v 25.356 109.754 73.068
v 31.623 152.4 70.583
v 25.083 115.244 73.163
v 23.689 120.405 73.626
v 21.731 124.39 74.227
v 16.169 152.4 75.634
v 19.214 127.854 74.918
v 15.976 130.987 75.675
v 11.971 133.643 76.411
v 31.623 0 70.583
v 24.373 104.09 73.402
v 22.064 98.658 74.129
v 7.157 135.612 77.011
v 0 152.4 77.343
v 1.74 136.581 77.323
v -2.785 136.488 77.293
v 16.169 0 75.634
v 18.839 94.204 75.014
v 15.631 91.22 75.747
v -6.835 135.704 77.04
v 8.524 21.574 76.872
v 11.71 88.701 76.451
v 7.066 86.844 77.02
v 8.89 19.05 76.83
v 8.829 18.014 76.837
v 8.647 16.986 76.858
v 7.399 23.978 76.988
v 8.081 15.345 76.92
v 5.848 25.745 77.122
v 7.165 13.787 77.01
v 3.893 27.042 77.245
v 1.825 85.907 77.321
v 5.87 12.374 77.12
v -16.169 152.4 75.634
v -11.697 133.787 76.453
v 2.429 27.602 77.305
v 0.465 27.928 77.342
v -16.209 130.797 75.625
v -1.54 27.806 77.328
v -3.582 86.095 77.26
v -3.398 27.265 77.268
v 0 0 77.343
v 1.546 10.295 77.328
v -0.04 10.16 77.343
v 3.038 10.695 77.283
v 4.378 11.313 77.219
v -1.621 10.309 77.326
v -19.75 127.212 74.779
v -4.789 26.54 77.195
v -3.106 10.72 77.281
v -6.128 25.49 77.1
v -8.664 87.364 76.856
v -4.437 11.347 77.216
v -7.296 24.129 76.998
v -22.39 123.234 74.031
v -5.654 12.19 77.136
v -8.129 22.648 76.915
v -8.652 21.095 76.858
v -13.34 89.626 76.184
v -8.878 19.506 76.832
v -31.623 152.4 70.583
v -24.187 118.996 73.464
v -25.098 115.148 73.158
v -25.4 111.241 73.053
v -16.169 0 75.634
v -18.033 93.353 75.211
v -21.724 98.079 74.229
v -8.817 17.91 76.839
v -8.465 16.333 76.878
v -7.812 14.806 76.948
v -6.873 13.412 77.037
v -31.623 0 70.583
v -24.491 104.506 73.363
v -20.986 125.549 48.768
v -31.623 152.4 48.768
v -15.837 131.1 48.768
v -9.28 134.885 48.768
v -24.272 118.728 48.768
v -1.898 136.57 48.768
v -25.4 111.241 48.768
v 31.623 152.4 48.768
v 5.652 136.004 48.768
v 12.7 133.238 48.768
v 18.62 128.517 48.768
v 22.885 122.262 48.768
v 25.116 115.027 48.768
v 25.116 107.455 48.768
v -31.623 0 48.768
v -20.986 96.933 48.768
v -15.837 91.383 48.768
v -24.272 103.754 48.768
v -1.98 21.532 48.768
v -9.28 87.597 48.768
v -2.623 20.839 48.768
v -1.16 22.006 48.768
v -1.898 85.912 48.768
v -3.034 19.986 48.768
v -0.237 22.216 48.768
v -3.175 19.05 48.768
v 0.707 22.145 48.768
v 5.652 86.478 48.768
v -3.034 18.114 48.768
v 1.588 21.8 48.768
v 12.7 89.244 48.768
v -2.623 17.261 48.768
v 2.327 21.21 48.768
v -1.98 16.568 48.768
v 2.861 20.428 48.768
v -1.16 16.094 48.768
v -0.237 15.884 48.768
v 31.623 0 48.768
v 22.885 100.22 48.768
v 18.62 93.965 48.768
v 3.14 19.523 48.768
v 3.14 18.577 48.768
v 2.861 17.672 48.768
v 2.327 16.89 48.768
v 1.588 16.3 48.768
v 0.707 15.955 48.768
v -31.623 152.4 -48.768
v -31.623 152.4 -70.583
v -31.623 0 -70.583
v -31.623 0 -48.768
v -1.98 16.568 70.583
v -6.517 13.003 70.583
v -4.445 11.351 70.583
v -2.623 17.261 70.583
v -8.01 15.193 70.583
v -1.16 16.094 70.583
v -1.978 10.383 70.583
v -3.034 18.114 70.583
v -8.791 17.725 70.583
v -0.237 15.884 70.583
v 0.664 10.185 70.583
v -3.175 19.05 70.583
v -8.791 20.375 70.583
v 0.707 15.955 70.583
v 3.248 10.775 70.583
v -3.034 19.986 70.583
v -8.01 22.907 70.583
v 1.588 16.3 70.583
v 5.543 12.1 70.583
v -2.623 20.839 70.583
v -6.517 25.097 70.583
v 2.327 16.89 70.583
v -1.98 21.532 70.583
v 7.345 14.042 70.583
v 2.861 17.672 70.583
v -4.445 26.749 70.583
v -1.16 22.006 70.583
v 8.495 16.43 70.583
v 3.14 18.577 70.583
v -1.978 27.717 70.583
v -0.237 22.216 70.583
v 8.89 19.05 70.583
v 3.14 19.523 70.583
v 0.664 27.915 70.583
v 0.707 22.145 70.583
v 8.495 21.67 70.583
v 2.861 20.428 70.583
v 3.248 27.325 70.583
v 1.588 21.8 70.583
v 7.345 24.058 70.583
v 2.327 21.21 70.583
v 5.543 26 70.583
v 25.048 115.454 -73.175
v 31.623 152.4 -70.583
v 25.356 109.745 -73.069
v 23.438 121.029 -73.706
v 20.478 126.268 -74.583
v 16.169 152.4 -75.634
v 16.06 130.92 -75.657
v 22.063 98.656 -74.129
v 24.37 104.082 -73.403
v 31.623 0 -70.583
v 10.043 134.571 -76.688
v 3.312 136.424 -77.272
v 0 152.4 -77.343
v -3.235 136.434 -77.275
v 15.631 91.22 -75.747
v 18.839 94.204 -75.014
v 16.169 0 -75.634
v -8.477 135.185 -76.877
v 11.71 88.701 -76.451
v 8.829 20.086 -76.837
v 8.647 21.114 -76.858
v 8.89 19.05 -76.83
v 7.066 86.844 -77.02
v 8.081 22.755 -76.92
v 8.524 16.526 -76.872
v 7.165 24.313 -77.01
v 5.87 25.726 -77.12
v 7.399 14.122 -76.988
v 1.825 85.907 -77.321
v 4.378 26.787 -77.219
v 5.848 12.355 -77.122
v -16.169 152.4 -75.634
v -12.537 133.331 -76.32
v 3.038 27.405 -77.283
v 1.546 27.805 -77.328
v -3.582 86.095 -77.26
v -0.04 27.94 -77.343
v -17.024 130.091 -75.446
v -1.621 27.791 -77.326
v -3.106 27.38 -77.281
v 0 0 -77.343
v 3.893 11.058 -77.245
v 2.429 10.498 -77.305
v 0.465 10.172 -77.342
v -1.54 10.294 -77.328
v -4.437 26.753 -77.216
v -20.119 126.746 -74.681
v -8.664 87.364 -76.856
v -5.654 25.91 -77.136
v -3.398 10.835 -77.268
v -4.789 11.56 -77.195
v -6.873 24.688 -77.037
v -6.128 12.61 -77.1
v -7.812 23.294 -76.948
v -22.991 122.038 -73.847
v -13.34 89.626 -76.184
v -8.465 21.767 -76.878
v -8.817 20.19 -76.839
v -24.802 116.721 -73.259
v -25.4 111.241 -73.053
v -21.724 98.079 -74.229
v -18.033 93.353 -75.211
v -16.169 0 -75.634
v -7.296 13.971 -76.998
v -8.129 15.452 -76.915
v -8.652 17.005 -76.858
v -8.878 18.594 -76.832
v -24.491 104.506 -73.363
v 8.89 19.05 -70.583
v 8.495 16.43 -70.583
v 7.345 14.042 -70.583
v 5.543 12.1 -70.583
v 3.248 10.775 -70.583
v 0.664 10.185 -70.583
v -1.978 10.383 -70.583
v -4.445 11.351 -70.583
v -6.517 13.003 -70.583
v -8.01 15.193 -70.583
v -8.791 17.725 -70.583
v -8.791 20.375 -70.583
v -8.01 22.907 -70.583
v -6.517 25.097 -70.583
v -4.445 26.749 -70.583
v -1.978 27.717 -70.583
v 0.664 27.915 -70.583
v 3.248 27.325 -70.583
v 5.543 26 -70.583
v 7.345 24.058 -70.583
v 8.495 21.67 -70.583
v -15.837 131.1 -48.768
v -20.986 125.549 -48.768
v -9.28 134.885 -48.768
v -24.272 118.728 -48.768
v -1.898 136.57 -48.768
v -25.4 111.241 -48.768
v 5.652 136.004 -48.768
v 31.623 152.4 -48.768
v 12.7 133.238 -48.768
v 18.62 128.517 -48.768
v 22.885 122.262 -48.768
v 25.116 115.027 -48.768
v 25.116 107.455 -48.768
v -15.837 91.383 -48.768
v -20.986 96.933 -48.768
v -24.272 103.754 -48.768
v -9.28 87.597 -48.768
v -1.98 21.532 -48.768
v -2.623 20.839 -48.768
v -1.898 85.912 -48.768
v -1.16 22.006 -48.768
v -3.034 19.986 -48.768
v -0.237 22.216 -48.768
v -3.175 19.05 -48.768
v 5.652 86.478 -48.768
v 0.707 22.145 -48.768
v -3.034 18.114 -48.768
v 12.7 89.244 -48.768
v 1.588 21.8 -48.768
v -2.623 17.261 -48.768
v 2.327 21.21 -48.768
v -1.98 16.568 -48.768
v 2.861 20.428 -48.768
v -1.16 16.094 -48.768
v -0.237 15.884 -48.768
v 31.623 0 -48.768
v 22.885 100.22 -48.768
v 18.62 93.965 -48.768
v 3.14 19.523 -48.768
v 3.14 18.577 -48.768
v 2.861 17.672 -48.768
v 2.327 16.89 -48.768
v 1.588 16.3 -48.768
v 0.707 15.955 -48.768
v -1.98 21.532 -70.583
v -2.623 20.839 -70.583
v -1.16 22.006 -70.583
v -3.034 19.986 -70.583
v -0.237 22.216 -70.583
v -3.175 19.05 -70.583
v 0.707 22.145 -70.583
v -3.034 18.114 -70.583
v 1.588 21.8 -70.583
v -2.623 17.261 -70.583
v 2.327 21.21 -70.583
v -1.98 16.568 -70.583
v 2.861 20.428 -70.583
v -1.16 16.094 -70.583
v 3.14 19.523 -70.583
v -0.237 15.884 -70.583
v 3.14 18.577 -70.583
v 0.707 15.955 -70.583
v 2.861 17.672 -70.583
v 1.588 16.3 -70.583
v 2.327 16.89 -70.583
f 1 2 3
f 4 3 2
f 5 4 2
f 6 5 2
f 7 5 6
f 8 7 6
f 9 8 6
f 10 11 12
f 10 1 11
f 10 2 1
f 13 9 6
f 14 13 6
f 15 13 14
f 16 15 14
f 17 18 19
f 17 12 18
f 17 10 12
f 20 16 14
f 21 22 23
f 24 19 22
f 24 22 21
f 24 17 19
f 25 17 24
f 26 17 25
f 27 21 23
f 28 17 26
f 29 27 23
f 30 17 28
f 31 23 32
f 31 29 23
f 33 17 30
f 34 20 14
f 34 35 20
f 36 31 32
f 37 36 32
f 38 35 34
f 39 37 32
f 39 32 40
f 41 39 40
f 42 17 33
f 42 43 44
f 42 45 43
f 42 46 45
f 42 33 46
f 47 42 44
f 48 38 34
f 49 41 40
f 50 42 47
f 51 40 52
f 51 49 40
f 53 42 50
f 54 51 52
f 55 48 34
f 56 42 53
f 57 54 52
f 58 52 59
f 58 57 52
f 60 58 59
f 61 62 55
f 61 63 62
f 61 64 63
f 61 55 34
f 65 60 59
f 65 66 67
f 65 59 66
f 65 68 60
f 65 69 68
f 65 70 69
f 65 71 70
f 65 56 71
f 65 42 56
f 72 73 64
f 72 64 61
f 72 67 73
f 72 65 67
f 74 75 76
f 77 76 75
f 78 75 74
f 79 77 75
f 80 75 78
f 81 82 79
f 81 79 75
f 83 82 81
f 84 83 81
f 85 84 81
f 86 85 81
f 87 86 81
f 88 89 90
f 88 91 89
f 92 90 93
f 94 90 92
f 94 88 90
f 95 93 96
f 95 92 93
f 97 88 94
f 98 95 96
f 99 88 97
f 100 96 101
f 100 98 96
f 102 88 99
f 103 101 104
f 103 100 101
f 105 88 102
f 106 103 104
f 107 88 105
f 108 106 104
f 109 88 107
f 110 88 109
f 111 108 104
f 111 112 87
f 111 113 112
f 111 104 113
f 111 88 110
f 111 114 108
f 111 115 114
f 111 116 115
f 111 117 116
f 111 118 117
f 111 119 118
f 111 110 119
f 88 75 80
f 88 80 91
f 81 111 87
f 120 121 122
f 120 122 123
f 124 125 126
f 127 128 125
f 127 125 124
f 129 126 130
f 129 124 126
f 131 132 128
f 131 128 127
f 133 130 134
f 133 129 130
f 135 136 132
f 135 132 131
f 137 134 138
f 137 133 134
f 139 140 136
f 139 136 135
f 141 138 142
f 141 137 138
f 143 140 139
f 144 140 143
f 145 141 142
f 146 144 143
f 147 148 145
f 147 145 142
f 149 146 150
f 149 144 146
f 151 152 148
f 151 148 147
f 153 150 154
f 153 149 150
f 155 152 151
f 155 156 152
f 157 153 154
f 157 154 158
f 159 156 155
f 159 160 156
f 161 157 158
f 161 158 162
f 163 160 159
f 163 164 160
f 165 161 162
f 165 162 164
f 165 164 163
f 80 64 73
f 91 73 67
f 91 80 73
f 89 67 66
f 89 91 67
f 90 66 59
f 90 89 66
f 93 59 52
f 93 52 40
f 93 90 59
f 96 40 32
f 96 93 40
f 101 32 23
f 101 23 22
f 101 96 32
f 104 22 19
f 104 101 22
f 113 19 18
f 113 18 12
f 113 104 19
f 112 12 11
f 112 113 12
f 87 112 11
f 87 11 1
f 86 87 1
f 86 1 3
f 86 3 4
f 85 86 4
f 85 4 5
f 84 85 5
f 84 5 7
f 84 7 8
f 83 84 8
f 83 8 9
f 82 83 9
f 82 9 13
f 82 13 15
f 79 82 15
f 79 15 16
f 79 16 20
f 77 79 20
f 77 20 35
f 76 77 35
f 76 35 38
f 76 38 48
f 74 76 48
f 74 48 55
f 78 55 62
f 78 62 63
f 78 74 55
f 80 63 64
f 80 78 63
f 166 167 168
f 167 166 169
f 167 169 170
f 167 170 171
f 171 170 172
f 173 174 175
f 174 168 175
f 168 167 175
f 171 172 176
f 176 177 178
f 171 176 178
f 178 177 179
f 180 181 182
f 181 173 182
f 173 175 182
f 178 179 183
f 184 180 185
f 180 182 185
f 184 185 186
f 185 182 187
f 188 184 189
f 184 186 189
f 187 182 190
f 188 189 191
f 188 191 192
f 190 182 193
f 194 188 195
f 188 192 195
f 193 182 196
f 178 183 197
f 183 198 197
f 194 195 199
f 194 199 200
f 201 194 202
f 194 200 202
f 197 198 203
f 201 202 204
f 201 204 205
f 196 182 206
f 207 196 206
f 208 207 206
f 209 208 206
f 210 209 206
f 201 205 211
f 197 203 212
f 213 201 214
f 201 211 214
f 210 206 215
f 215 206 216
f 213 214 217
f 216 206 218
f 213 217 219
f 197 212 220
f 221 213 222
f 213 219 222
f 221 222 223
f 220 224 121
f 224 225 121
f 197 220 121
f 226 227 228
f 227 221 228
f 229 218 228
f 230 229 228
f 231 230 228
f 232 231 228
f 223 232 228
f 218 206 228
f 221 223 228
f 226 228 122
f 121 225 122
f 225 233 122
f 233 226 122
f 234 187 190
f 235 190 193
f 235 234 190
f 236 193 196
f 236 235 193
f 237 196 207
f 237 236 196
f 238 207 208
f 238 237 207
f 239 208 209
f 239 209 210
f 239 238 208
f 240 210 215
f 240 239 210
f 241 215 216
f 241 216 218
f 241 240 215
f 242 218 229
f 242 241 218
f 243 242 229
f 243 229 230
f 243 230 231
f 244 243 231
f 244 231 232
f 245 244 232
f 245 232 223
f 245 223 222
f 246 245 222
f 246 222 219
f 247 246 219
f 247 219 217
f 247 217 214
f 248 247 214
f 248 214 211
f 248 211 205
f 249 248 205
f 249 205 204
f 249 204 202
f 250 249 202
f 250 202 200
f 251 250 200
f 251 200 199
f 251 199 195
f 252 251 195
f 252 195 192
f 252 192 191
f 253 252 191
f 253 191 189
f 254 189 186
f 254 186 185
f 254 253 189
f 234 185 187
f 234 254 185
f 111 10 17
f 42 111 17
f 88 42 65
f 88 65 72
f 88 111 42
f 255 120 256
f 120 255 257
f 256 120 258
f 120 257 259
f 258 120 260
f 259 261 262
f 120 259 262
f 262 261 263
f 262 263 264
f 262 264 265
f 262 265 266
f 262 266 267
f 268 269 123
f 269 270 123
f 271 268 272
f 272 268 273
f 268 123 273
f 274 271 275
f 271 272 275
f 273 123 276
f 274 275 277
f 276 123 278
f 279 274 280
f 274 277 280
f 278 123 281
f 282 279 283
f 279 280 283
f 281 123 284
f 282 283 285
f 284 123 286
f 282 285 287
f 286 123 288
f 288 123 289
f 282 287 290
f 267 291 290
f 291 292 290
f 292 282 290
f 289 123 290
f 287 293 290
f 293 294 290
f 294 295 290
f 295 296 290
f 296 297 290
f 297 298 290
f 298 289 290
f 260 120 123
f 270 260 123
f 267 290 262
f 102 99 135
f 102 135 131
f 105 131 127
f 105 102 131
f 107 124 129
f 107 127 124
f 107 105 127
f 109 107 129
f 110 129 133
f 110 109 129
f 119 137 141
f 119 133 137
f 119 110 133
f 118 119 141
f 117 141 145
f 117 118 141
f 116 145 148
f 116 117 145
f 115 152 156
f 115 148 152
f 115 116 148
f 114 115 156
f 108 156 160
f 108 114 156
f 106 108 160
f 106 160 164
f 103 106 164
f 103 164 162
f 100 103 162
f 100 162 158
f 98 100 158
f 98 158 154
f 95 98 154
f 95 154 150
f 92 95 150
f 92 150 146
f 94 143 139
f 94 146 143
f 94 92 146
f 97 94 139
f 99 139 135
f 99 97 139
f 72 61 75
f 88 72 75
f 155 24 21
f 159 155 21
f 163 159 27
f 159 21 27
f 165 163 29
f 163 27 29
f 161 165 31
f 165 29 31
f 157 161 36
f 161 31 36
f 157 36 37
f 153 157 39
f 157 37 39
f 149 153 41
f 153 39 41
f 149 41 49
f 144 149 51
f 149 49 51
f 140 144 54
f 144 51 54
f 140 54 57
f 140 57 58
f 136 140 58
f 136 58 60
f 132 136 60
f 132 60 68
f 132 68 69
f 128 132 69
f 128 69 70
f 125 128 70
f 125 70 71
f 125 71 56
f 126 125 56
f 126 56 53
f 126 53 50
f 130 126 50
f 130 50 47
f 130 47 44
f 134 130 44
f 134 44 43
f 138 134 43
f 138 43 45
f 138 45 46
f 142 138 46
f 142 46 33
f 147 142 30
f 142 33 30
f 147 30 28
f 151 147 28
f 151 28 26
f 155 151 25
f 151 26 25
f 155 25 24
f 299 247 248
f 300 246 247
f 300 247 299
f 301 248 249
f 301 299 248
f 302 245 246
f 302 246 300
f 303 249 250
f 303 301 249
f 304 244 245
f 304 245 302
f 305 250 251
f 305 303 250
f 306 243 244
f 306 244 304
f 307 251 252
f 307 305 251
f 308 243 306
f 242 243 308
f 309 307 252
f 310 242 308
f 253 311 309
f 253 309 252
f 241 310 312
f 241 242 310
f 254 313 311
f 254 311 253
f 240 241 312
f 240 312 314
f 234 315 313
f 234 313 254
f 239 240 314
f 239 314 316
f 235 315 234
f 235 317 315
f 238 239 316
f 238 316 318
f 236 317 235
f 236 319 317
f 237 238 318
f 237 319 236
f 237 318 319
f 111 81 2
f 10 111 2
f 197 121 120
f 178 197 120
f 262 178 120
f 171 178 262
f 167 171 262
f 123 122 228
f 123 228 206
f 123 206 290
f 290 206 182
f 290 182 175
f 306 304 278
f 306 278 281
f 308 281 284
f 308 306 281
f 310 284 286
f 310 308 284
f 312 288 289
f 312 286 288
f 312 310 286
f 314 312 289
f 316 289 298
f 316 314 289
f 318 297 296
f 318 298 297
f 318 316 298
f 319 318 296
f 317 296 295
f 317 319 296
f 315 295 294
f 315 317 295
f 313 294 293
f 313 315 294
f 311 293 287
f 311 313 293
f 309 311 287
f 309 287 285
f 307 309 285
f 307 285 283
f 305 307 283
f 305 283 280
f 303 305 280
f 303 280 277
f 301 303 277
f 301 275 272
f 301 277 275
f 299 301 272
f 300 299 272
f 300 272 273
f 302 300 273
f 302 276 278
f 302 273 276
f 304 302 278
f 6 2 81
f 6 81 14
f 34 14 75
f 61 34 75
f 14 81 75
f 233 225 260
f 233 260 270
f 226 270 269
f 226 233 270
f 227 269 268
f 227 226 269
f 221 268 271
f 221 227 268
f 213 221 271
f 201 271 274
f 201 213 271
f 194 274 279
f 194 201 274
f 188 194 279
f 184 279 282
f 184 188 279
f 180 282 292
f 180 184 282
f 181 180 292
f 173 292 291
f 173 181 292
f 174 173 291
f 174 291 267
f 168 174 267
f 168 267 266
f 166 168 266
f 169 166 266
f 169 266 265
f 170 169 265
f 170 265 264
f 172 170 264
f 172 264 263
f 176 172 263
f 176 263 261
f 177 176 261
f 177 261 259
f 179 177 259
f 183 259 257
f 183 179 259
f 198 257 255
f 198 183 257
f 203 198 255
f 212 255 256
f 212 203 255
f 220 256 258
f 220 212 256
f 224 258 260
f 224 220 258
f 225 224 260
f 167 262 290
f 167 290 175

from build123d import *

# Parameters (mm, degrees)
BOSS_EXTRUDE1_DEPTH     = 152.4
BOSS_EXTRUDE1_2_DEPTH   = 152.4
CUT_EXTRUDE1_DEPTH      = 127
CUT_EXTRUDE1_DEPTH_BACK = 30.48
SKETCH4_R               = 3.175
CUT_EXTRUDE2_DEPTH      = 127
CUT_EXTRUDE2_DEPTH_BACK = 30.48
SKETCH5_R               = 25.4
SKETCH6_R               = 8.89
CUT_EXTRUDE3_DEPTH      = 10.16
CUT_EXTRUDE4_START      = 10.16
SKETCH7_R               = 8.89
CUT_EXTRUDE4_DEPTH      = 10.16


with BuildPart() as part:
    # Sketch3 → Boss-Extrude1 (new body)
    with BuildSketch(Plane(origin=(0, 0, 0), x_dir=(1, 0, 0), z_dir=(0, 1, 0))):
        with BuildLine():
            Line((-31.623, 48.768), (31.623, 48.768))
            Line((31.623, 48.768), (31.623, 70.582756534))
            ThreePointArc((31.623, 70.582756534), (0, 77.343), (-31.623, 70.582756534))
            Line((-31.623, 70.582756534), (-31.623, 48.768))
        make_face()
    extrude(amount=BOSS_EXTRUDE1_DEPTH)


with BuildPart() as body_2:
    # Sketch3 → Boss-Extrude1 2 (new body)
    with BuildSketch(Plane(origin=(0, 0, 0), x_dir=(1, 0, 0), z_dir=(0, 1, 0))):
        with BuildLine():
            Line((-31.623, -48.768), (31.623, -48.768))
            Line((31.623, -48.768), (31.623, -70.582756534))
            ThreePointArc((31.623, -70.582756534), (0, -77.343), (-31.623, -70.582756534))
            Line((-31.623, -70.582756534), (-31.623, -48.768))
        make_face()
    extrude(amount=BOSS_EXTRUDE1_2_DEPTH)


with BuildPart() as cut_extrude1_tool:
    # Sketch4 → Cut-Extrude1 (new, two sides: drawn at the far end of the back side and taken through both)
    with BuildSketch(Plane.XY.offset(-48.768).offset(-CUT_EXTRUDE1_DEPTH_BACK)):
        with Locations(Location((0, 19.05, 0), (0, 0, 180))):
            Circle(SKETCH4_R)
    extrude(amount=CUT_EXTRUDE1_DEPTH + CUT_EXTRUDE1_DEPTH_BACK)


with BuildPart() as part_1:
    add(part.part)

    # Cut-Extrude1: cut by cut_extrude1_tool
    add(cut_extrude1_tool.part, mode=Mode.SUBTRACT)


with BuildPart() as body_2_1:
    add(body_2.part)

    # Cut-Extrude1: cut by cut_extrude1_tool
    add(cut_extrude1_tool.part, mode=Mode.SUBTRACT)


with BuildPart() as cut_extrude2_tool:
    # Sketch5 → Cut-Extrude2 (new, two sides: drawn at the far end of the back side and taken through both)
    with BuildSketch(Plane.XY.offset(-48.768).offset(-CUT_EXTRUDE2_DEPTH_BACK)):
        with Locations(Location((0, 111.241035357, 0), (0, 0, 180))):
            Circle(SKETCH5_R)
    extrude(amount=CUT_EXTRUDE2_DEPTH + CUT_EXTRUDE2_DEPTH_BACK)


with BuildPart() as part_2:
    add(part_1.part)

    # Cut-Extrude2: cut by cut_extrude2_tool
    add(cut_extrude2_tool.part, mode=Mode.SUBTRACT)

    # Sketch6 → Cut-Extrude3 (cut)
    with BuildSketch(Plane(origin=(0, 0, -70.582756534), x_dir=(-1, 0, 0), z_dir=(0, 0, -1))):
        with Locations(Location((0, 19.05, 0), (0, 0, 180))):
            Circle(SKETCH6_R)
    extrude(amount=CUT_EXTRUDE3_DEPTH, mode=Mode.SUBTRACT)


with BuildPart() as body_2_2:
    add(body_2_1.part)

    # Cut-Extrude2: cut by cut_extrude2_tool
    add(cut_extrude2_tool.part, mode=Mode.SUBTRACT)

    # Sketch7 → Cut-Extrude4 (cut)
    with BuildSketch(Plane.XY.offset(70.582756534).offset(CUT_EXTRUDE4_START)):
        with Locations((0, 19.05)):
            Circle(SKETCH7_R)
    extrude(amount=-CUT_EXTRUDE4_DEPTH, mode=Mode.SUBTRACT)


solid = Compound([part_2.part, body_2_2.part])
